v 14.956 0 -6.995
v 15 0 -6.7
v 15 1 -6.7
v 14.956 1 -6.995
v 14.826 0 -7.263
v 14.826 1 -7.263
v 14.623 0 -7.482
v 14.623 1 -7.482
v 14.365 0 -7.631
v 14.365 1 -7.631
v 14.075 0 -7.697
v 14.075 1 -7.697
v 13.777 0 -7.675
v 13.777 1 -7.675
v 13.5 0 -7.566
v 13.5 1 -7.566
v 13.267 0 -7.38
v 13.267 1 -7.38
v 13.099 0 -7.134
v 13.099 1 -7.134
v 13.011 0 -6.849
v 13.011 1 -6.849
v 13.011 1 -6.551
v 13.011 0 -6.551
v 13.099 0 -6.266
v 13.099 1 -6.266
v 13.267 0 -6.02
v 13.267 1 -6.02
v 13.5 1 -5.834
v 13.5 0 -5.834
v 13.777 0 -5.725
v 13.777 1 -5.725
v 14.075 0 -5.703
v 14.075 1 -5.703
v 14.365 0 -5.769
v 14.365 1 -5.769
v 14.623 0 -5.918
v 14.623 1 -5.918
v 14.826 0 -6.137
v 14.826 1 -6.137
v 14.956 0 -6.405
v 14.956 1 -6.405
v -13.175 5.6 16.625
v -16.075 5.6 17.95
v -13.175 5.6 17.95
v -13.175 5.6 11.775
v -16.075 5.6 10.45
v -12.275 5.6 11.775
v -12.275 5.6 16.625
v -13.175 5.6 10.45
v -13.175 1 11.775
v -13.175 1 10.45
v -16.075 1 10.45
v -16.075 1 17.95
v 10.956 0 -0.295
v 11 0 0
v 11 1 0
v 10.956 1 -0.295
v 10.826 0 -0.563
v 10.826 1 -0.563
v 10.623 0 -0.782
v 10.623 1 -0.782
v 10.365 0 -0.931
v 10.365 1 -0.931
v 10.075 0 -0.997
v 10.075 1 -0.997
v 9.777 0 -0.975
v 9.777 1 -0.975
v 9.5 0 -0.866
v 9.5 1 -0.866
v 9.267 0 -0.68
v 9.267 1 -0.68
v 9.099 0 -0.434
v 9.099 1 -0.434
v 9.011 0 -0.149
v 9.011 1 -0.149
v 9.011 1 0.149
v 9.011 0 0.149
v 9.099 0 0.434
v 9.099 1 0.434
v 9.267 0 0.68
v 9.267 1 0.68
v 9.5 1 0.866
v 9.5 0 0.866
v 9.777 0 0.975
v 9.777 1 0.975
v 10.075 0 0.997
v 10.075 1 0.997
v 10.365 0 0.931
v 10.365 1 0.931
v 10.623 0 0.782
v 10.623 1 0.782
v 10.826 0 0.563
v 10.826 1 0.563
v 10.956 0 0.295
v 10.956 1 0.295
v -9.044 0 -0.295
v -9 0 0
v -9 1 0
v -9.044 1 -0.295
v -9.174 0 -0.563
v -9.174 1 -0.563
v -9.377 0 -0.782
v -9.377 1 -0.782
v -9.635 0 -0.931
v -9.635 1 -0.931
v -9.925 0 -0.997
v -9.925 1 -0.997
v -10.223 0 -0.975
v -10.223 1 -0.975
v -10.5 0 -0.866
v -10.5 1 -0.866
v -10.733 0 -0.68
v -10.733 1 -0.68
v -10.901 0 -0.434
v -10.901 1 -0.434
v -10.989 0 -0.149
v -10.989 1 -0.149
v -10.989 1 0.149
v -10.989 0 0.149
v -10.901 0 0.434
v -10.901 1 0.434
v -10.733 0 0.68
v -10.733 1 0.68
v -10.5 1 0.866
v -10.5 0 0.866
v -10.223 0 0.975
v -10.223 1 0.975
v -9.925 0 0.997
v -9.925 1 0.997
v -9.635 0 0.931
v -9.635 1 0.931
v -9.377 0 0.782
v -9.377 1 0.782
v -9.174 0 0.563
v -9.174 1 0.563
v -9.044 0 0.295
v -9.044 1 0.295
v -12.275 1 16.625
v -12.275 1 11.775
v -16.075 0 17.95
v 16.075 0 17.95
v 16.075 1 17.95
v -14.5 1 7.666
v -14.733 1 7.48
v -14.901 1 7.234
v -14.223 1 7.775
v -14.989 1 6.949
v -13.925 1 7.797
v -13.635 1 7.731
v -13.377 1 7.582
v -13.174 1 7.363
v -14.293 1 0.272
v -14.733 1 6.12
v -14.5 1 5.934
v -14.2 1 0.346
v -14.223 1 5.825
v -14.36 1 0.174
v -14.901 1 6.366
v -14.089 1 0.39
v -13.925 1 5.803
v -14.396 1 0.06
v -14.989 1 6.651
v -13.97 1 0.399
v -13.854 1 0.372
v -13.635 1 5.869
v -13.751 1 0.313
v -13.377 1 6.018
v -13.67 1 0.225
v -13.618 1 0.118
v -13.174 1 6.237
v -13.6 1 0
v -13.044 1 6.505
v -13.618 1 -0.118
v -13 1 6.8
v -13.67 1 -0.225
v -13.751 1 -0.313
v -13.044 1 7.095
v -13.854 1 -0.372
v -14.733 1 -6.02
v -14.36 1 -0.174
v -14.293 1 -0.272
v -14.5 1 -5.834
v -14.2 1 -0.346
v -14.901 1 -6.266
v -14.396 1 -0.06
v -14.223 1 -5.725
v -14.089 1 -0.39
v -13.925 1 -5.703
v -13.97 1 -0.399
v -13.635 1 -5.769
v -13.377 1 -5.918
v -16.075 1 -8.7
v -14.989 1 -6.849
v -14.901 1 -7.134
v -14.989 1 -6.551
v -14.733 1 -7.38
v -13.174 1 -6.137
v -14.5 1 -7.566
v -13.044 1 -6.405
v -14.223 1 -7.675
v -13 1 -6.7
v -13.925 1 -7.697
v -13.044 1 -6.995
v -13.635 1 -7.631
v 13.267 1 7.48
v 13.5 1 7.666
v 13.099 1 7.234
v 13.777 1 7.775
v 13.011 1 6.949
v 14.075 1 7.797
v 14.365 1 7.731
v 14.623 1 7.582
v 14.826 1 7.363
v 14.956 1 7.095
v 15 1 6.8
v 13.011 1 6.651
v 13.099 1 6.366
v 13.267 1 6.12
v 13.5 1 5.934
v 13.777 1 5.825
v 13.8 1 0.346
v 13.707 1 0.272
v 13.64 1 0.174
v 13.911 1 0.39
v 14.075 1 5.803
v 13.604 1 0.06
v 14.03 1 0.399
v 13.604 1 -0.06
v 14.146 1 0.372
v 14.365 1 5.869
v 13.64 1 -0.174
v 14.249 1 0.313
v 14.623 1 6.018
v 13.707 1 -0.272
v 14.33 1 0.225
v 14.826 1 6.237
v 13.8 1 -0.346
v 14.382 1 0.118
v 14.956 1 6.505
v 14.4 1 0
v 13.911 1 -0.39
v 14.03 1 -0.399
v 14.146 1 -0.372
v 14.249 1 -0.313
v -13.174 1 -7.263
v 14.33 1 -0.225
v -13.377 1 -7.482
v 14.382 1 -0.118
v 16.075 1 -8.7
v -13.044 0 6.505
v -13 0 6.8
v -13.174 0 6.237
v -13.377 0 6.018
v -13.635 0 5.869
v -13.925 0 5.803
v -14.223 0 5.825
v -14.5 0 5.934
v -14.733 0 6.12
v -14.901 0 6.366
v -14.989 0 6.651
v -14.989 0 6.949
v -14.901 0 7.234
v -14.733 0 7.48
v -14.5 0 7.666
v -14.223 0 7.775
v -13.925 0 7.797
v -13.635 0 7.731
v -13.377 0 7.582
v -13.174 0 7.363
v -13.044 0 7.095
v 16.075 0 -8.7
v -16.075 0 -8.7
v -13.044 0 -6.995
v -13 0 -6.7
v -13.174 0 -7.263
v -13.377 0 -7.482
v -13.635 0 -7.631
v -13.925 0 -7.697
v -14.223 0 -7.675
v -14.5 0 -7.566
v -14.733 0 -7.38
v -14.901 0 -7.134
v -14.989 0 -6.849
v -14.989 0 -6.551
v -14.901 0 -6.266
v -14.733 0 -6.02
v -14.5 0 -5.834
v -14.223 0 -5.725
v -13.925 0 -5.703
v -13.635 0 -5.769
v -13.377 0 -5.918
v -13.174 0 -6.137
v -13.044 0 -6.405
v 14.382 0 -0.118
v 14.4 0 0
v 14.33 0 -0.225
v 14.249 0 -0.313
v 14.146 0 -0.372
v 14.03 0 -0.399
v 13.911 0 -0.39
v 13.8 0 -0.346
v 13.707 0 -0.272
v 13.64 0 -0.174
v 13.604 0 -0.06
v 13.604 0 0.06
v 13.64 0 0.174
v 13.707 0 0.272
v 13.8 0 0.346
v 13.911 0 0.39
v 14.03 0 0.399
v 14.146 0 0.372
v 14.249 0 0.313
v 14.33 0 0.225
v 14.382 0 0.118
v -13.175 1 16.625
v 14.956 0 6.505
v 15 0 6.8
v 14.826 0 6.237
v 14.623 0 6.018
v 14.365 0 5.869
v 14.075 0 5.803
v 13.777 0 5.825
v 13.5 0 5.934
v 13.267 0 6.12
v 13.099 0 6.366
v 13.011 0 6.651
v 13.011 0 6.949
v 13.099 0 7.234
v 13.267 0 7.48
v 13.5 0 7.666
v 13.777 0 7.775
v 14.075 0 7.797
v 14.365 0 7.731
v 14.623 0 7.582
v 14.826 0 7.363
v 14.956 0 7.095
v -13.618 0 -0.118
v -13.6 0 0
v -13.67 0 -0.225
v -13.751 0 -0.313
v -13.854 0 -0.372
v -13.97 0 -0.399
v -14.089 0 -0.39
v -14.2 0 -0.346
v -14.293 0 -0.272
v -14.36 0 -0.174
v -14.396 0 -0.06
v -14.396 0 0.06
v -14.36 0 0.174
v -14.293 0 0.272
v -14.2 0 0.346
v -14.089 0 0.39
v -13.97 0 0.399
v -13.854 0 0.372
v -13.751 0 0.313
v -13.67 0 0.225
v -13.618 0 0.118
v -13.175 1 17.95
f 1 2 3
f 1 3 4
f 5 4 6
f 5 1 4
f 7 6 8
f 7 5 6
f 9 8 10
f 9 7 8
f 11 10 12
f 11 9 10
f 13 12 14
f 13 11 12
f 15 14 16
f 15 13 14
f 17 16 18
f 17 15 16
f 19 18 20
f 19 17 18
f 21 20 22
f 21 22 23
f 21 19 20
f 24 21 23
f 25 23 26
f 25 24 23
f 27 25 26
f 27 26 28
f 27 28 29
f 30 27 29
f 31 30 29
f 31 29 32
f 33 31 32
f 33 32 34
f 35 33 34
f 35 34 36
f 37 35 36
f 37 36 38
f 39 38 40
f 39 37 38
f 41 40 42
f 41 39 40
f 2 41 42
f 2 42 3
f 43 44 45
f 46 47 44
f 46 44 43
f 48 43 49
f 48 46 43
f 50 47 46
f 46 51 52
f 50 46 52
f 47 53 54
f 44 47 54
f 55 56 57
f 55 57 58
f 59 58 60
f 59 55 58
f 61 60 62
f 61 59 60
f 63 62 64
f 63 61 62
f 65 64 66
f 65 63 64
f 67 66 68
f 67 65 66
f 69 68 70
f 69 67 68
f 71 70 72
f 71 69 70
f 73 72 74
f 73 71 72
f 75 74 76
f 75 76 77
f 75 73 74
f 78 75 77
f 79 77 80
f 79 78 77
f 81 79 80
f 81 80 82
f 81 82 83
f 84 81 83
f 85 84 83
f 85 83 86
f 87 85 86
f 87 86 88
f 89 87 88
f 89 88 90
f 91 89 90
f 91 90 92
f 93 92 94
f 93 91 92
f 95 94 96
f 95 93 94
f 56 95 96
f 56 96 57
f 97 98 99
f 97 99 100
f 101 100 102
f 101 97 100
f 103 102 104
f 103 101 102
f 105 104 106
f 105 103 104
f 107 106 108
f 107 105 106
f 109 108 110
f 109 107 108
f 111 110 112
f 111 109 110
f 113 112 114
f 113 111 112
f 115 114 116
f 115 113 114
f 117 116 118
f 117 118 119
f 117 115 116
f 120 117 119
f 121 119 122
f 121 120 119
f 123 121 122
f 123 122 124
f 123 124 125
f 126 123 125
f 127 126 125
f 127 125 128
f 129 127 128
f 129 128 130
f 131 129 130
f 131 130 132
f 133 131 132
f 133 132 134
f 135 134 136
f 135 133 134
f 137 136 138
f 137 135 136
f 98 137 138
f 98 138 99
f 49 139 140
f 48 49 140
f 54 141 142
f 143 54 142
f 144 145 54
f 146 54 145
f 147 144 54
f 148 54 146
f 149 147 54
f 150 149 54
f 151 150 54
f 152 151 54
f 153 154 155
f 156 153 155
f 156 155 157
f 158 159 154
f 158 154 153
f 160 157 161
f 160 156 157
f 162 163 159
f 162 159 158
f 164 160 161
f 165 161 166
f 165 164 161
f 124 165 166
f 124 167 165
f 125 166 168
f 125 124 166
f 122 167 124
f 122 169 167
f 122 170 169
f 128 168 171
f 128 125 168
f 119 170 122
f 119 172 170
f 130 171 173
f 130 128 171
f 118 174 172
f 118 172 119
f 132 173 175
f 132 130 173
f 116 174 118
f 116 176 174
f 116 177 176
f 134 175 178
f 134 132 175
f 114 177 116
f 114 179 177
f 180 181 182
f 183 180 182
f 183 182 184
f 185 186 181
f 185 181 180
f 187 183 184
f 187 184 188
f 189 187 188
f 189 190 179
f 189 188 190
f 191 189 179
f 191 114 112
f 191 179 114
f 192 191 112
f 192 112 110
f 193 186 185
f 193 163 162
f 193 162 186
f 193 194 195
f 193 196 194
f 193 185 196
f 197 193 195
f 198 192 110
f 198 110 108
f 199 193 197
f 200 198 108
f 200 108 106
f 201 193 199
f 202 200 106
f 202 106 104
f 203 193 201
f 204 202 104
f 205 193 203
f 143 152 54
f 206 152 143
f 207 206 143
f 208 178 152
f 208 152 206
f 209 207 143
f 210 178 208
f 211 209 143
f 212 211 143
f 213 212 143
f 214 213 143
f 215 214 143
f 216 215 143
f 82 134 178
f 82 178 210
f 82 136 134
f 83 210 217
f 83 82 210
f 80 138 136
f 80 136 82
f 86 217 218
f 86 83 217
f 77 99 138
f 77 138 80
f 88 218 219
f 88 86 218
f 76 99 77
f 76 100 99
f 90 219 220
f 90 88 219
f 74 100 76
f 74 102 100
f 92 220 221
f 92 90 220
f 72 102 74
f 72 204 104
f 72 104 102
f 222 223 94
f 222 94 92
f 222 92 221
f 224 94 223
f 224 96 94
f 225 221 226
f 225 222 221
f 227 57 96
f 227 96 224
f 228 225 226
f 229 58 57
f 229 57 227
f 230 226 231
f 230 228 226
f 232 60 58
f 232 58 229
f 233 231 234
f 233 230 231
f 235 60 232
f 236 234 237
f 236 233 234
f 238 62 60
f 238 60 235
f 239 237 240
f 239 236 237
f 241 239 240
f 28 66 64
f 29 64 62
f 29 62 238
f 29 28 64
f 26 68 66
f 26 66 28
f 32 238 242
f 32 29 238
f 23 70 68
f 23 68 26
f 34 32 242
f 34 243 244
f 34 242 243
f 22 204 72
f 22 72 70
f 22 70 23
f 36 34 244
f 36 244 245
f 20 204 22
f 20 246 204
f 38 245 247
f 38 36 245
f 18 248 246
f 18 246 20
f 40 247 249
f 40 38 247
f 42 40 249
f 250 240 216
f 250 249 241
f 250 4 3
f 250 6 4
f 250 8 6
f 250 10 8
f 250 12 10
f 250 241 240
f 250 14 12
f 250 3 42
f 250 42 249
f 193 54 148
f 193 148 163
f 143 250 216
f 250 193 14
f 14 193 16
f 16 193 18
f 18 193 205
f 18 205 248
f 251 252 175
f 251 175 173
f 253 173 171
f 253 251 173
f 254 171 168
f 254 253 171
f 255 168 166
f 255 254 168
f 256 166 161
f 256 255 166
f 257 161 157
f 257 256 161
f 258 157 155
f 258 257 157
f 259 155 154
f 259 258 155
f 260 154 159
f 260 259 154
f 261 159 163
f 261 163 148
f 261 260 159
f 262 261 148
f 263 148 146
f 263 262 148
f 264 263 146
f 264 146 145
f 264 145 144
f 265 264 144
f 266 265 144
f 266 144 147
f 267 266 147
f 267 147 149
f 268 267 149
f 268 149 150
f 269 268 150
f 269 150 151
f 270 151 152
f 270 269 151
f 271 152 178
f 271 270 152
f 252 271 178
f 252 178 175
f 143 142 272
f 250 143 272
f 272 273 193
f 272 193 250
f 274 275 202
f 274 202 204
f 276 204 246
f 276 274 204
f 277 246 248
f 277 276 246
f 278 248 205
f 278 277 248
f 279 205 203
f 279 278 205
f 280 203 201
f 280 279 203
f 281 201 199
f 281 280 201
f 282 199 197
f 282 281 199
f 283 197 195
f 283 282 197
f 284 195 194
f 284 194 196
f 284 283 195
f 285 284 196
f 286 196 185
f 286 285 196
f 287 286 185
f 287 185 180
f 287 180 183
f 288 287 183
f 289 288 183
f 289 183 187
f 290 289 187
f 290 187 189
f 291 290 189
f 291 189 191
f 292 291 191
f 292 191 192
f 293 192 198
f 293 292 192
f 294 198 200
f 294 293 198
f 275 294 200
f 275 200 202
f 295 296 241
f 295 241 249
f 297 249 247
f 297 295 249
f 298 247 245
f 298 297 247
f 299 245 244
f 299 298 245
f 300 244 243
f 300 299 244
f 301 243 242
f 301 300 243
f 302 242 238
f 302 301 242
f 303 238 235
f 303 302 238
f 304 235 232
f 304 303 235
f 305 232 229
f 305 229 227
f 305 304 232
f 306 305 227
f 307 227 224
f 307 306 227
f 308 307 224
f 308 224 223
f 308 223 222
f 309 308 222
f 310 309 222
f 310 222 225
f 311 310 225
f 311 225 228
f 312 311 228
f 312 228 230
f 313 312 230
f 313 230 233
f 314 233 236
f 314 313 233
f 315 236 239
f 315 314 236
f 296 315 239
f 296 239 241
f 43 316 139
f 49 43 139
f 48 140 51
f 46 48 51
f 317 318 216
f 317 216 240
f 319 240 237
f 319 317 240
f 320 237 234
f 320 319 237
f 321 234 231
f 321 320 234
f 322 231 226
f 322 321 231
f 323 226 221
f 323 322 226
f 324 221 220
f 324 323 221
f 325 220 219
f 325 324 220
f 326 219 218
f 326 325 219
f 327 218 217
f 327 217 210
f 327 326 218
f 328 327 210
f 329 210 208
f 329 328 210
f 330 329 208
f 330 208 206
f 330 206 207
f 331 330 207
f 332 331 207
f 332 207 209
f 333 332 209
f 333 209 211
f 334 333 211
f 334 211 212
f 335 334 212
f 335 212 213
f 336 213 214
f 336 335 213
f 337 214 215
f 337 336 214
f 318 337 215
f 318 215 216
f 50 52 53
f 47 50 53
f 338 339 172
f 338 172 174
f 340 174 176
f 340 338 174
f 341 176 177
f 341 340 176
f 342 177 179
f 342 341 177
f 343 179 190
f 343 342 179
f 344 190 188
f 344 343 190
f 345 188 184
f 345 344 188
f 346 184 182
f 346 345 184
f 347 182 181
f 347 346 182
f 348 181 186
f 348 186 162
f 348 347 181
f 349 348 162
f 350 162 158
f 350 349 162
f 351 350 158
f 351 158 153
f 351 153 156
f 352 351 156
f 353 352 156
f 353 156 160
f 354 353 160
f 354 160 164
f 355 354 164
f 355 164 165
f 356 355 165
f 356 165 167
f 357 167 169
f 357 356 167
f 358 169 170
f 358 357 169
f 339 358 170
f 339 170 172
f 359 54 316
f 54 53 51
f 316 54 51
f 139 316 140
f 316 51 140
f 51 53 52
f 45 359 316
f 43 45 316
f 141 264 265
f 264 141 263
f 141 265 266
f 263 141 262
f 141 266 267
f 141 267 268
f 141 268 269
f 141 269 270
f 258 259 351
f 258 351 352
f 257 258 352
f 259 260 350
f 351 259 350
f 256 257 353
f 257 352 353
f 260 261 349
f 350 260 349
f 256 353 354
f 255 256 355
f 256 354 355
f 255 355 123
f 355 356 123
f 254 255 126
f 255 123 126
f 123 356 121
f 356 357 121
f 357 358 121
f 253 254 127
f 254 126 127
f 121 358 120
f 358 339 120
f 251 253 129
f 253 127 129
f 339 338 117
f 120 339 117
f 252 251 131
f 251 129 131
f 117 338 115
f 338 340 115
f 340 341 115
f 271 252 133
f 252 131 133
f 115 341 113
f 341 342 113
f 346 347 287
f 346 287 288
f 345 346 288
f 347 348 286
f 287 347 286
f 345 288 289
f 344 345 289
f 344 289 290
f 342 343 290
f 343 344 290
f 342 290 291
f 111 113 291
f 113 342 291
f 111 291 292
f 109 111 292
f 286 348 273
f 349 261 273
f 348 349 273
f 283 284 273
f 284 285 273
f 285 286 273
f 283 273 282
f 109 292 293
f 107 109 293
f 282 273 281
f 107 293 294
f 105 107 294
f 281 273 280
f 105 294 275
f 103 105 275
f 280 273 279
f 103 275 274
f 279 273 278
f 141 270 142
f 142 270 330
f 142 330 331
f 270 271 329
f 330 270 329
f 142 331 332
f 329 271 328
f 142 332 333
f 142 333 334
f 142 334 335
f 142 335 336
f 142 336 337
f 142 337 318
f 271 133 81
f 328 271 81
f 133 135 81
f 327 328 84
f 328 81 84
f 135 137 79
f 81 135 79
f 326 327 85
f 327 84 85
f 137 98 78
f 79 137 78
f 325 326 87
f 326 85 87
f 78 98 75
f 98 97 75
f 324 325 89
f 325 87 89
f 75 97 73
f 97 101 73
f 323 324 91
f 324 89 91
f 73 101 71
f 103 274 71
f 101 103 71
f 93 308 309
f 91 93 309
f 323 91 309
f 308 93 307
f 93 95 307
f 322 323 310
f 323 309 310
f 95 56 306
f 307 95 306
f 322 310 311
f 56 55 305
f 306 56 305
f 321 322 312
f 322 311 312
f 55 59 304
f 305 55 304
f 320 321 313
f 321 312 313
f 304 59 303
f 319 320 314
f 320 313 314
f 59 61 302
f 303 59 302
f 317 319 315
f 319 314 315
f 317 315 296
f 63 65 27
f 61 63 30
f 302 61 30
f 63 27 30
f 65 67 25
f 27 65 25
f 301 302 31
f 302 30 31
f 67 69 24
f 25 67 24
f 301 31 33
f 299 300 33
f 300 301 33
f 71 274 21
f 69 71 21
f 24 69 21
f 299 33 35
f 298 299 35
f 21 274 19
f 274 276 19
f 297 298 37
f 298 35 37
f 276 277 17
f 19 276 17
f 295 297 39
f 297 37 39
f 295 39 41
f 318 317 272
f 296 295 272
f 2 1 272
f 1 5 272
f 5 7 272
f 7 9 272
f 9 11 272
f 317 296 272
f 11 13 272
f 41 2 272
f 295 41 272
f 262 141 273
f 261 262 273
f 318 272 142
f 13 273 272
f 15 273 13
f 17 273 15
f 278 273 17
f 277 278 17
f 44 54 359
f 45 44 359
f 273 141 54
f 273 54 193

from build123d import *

# Parameters (mm, degrees)
SKETCH1_W           = 32.15
SKETCH1_H           = 26.65
SKETCH1_R           = 1
SKETCH1_R_2         = 0.4
BOSS_EXTRUDE1_DEPTH = 1
BOSS_EXTRUDE3_DEPTH = 4.6


with BuildPart() as part:
    # Sketch1 → Boss-Extrude1 (new body)
    with BuildSketch(Plane(origin=(0, 0, 0), x_dir=(1, 0, 0), z_dir=(0, 1, 0))):
        with Locations((0, -4.625)):
            Rectangle(SKETCH1_W, SKETCH1_H)
        with Locations((14, 6.7)):
            Circle(SKETCH1_R, mode=Mode.SUBTRACT)
        with Locations((14, -6.8)):
            Circle(SKETCH1_R, mode=Mode.SUBTRACT)
        with Locations((14, 0)):
            Circle(SKETCH1_R_2, mode=Mode.SUBTRACT)
        with Locations((10, 0)):
            Circle(SKETCH1_R, mode=Mode.SUBTRACT)
        with Locations((-14, 0)):
            Circle(SKETCH1_R_2, mode=Mode.SUBTRACT)
        with Locations((-14, -6.8)):
            Circle(SKETCH1_R, mode=Mode.SUBTRACT)
        with Locations((-14, 6.7)):
            Circle(SKETCH1_R, mode=Mode.SUBTRACT)
        with Locations((-10, 0)):
            Circle(SKETCH1_R, mode=Mode.SUBTRACT)
    extrude(amount=BOSS_EXTRUDE1_DEPTH)


with BuildPart() as body_2:
    # Sketch5 → Boss-Extrude3 (new body)
    with BuildSketch(Plane(origin=(0, 1, 0), x_dir=(1, 0, 0), z_dir=(0, 1, 0))):
        Polygon((-16.075, -17.95), (-13.175, -17.95), (-13.175, -16.625), (-12.275, -16.625), (-12.275, -11.775), (-13.175, -11.775), (-13.175, -10.45), (-16.075, -10.45), align=None)
    extrude(amount=BOSS_EXTRUDE3_DEPTH)


solid = Compound([part.part, body_2.part])
